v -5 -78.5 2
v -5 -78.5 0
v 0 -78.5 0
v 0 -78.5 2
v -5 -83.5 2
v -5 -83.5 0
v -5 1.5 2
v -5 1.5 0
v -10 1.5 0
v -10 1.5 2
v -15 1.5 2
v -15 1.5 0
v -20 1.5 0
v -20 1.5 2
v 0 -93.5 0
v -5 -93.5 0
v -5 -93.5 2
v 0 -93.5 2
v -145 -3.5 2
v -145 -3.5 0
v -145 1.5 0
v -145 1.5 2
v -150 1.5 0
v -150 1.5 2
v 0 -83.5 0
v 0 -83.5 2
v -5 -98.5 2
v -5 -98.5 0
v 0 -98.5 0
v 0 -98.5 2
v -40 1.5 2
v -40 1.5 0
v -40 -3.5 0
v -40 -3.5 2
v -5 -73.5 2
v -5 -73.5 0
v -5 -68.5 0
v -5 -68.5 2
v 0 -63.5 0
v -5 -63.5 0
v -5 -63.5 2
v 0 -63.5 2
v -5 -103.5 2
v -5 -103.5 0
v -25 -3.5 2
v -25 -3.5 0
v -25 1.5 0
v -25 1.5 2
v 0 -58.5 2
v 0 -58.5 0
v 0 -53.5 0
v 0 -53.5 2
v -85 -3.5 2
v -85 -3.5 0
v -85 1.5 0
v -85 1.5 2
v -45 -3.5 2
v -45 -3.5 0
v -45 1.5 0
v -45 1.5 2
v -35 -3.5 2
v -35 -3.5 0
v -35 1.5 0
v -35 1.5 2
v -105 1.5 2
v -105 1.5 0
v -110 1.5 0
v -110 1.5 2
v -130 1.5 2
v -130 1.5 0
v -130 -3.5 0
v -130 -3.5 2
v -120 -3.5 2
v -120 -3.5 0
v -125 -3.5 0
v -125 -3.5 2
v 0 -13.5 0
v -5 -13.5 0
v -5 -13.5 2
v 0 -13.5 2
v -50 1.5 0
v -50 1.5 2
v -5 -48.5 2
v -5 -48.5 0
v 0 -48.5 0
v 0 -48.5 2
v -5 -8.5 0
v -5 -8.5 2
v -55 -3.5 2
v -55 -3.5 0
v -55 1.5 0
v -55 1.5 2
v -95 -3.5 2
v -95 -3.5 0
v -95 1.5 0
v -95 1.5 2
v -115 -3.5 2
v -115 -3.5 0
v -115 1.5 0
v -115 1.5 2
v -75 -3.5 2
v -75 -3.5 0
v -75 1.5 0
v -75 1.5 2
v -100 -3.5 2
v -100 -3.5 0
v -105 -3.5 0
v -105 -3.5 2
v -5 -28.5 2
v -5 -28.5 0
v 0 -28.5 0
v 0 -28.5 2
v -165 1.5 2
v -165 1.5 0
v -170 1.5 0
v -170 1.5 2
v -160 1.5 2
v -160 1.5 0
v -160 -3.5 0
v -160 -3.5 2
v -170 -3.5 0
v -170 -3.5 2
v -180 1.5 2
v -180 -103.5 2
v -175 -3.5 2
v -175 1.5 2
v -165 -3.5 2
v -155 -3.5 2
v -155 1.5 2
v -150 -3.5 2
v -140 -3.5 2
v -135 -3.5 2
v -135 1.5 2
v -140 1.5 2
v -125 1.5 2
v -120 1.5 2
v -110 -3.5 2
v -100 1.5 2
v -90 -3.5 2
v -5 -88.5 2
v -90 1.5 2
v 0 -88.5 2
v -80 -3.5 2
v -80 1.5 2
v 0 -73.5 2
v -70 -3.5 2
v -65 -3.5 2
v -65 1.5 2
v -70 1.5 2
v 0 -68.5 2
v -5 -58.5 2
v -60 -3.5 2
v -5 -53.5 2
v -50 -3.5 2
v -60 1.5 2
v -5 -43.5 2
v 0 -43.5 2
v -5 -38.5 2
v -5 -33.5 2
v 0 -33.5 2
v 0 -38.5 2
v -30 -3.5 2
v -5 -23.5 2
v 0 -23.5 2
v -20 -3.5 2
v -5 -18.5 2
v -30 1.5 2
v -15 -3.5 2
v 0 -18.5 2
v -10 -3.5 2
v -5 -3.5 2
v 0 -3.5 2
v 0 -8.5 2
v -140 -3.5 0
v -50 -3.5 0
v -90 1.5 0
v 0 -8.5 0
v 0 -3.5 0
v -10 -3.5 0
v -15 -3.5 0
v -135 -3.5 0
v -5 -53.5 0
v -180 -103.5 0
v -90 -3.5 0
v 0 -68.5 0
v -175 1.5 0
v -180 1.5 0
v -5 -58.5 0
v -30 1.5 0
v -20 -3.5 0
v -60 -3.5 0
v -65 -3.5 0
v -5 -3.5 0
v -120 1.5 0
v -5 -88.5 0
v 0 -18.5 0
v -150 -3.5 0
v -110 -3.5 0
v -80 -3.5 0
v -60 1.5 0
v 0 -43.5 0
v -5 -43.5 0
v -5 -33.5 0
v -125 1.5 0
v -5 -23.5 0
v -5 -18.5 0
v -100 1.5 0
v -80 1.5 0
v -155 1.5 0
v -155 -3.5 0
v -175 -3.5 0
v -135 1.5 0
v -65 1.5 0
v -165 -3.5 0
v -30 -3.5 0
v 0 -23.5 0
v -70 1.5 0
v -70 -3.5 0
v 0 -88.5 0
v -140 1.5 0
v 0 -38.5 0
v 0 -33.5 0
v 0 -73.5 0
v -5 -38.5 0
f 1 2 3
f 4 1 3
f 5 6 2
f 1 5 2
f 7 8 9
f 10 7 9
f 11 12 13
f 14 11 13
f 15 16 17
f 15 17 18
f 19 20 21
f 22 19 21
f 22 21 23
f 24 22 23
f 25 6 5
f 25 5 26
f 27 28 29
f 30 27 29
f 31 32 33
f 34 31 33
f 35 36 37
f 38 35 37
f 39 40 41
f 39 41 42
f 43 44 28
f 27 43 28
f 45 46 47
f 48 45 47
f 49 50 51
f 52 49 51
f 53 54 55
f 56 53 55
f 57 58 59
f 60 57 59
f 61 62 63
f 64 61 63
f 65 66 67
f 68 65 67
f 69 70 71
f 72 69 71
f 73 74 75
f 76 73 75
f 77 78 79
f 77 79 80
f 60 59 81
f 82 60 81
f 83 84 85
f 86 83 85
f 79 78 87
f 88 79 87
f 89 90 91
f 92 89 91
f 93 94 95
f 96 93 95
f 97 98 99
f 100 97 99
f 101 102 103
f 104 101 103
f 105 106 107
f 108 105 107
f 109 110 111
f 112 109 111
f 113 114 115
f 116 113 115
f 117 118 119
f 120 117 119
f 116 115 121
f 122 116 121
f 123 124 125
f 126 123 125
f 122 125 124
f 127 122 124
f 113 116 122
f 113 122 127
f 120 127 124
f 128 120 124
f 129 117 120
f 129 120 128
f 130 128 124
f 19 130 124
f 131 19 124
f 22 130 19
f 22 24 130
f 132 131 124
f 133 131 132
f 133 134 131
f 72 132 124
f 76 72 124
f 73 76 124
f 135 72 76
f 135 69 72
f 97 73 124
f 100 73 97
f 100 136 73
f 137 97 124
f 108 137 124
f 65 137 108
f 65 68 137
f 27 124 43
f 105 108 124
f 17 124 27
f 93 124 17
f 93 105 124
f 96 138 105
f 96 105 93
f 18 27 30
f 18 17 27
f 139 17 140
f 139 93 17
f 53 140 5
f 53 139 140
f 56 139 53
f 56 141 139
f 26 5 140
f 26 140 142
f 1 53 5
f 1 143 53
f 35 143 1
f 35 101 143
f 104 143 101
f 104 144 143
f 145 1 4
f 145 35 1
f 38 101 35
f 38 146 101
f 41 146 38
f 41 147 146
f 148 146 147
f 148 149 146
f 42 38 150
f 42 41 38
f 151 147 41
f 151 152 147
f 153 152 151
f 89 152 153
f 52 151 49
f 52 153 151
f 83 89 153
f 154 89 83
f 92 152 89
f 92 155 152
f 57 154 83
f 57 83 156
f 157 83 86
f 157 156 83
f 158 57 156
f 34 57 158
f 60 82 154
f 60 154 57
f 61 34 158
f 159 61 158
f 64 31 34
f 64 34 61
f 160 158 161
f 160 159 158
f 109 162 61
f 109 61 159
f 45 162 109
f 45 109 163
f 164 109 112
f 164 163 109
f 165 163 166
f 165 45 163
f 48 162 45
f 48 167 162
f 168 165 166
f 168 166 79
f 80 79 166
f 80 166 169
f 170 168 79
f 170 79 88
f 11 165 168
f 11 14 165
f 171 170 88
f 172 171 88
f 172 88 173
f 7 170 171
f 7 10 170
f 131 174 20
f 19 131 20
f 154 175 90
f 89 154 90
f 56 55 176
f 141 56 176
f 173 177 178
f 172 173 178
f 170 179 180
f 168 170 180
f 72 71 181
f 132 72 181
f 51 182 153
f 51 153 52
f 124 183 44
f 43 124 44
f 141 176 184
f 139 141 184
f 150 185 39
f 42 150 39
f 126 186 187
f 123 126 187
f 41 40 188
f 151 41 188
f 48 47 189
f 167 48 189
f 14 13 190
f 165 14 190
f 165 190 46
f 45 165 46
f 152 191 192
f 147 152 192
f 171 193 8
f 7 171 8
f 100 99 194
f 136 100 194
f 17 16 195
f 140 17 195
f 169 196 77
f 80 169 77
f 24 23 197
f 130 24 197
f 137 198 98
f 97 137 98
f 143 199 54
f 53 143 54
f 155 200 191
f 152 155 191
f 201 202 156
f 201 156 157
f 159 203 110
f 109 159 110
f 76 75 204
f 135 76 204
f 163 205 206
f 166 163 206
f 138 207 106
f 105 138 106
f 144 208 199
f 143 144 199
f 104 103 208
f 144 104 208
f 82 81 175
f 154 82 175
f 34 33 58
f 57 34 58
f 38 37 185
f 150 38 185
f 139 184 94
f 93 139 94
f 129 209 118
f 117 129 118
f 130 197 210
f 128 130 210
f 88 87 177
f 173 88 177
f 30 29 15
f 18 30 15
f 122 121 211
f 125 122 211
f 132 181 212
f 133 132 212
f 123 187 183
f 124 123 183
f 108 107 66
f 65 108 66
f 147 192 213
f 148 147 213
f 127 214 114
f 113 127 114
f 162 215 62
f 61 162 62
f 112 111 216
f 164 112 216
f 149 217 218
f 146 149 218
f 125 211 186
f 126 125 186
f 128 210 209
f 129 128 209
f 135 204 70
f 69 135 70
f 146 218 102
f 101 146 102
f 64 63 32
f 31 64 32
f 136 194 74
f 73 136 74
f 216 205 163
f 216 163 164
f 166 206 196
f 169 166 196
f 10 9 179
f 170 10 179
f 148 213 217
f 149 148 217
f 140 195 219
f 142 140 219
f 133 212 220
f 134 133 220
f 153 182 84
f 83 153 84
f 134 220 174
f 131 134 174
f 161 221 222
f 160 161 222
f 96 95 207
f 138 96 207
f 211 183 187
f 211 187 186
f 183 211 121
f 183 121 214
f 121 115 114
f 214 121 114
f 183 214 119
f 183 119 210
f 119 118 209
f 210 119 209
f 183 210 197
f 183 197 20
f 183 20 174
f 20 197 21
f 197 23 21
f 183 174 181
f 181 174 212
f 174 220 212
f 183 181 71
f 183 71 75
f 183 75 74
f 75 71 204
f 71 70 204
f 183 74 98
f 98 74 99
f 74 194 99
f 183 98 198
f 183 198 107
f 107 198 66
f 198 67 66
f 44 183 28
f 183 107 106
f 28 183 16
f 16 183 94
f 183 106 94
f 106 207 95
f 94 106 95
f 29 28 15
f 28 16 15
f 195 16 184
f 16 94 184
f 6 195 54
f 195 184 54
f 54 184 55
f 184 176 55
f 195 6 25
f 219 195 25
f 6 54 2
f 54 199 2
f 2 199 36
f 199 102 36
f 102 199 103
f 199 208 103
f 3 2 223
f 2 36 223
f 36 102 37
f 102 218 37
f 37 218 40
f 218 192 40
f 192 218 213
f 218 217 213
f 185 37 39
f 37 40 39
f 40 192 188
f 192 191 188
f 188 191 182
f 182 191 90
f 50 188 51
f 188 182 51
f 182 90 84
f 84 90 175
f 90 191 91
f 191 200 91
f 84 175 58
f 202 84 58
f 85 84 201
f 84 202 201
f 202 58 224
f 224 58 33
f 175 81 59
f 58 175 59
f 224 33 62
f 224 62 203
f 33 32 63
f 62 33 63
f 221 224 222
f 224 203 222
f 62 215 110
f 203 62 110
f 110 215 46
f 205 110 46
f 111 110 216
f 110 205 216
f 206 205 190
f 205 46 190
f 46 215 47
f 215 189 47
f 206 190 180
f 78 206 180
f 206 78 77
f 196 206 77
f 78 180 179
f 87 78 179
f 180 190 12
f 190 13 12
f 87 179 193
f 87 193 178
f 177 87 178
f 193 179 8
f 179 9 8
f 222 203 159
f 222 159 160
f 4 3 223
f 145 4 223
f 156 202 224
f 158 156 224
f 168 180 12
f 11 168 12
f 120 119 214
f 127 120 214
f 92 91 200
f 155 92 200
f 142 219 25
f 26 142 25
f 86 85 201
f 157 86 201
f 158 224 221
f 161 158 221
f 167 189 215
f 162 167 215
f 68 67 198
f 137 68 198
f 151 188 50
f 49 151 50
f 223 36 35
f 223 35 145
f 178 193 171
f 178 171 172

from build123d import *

# Parameters (mm, degrees)
F0_W     = 5
F0_H     = 5
F1_DEPTH = 2


with BuildPart() as f1:
    # F0 (on Top) → F1 (new body)
    with BuildSketch(Plane.XY):
        Polygon((-180, -3.5), (-180, -103.5), (-5, -103.5), (-5, -98.5), (-5, -93.5), (-5, -88.5), (-5, -83.5), (-5, -78.5), (-5, -73.5), (-5, -68.5), (-5, -63.5), (-5, -58.5), (-5, -53.5), (-5, -48.5), (-5, -43.5), (-5, -38.5), (-5, -33.5), (-5, -28.5), (-5, -23.5), (-5, -18.5), (-5, -13.5), (-5, -8.5), (-5, -3.5), (-5, 1.5), (-10, 1.5), (-10, -3.5), (-15, -3.5), (-15, 1.5), (-20, 1.5), (-20, -3.5), (-25, -3.5), (-25, 1.5), (-30, 1.5), (-30, -3.5), (-35, -3.5), (-35, 1.5), (-40, 1.5), (-40, -3.5), (-45, -3.5), (-45, 1.5), (-50, 1.5), (-50, -3.5), (-55, -3.5), (-55, 1.5), (-60, 1.5), (-60, -3.5), (-65, -3.5), (-65, 1.5), (-70, 1.5), (-70, -3.5), (-75, -3.5), (-75, 1.5), (-80, 1.5), (-80, -3.5), (-85, -3.5), (-85, 1.5), (-90, 1.5), (-90, -3.5), (-95, -3.5), (-95, 1.5), (-100, 1.5), (-100, -3.5), (-105, -3.5), (-105, 1.5), (-110, 1.5), (-110, -3.5), (-115, -3.5), (-115, 1.5), (-120, 1.5), (-120, -3.5), (-125, -3.5), (-125, 1.5), (-130, 1.5), (-130, -3.5), (-135, -3.5), (-135, 1.5), (-140, 1.5), (-140, -3.5), (-145, -3.5), (-145, 1.5), (-150, 1.5), (-150, -3.5), (-155, -3.5), (-155, 1.5), (-160, 1.5), (-160, -3.5), (-165, -3.5), (-165, 1.5), (-170, 1.5), (-170, -3.5), (-175, -3.5), (-175, 1.5), (-180, 1.5), align=None)
        with Locations((-2.5, -96)):
            Rectangle(F0_W, F0_H)
        with Locations((-2.5, -86)):
            Rectangle(F0_W, F0_H)
        with Locations((-2.5, -76)):
            Rectangle(F0_W, F0_H)
        with Locations((-2.5, -66)):
            Rectangle(F0_W, F0_H)
        with Locations((-2.5, -56)):
            Rectangle(F0_W, F0_H)
        with Locations((-2.5, -46)):
            Rectangle(F0_W, F0_H)
        with Locations((-2.5, -36)):
            Rectangle(F0_W, F0_H)
        with Locations((-2.5, -26)):
            Rectangle(F0_W, F0_H)
        with Locations((-2.5, -16)):
            Rectangle(F0_W, F0_H)
        with Locations((-2.5, -6)):
            Rectangle(F0_W, F0_H)
    extrude(amount=F1_DEPTH)


solid = f1.part
